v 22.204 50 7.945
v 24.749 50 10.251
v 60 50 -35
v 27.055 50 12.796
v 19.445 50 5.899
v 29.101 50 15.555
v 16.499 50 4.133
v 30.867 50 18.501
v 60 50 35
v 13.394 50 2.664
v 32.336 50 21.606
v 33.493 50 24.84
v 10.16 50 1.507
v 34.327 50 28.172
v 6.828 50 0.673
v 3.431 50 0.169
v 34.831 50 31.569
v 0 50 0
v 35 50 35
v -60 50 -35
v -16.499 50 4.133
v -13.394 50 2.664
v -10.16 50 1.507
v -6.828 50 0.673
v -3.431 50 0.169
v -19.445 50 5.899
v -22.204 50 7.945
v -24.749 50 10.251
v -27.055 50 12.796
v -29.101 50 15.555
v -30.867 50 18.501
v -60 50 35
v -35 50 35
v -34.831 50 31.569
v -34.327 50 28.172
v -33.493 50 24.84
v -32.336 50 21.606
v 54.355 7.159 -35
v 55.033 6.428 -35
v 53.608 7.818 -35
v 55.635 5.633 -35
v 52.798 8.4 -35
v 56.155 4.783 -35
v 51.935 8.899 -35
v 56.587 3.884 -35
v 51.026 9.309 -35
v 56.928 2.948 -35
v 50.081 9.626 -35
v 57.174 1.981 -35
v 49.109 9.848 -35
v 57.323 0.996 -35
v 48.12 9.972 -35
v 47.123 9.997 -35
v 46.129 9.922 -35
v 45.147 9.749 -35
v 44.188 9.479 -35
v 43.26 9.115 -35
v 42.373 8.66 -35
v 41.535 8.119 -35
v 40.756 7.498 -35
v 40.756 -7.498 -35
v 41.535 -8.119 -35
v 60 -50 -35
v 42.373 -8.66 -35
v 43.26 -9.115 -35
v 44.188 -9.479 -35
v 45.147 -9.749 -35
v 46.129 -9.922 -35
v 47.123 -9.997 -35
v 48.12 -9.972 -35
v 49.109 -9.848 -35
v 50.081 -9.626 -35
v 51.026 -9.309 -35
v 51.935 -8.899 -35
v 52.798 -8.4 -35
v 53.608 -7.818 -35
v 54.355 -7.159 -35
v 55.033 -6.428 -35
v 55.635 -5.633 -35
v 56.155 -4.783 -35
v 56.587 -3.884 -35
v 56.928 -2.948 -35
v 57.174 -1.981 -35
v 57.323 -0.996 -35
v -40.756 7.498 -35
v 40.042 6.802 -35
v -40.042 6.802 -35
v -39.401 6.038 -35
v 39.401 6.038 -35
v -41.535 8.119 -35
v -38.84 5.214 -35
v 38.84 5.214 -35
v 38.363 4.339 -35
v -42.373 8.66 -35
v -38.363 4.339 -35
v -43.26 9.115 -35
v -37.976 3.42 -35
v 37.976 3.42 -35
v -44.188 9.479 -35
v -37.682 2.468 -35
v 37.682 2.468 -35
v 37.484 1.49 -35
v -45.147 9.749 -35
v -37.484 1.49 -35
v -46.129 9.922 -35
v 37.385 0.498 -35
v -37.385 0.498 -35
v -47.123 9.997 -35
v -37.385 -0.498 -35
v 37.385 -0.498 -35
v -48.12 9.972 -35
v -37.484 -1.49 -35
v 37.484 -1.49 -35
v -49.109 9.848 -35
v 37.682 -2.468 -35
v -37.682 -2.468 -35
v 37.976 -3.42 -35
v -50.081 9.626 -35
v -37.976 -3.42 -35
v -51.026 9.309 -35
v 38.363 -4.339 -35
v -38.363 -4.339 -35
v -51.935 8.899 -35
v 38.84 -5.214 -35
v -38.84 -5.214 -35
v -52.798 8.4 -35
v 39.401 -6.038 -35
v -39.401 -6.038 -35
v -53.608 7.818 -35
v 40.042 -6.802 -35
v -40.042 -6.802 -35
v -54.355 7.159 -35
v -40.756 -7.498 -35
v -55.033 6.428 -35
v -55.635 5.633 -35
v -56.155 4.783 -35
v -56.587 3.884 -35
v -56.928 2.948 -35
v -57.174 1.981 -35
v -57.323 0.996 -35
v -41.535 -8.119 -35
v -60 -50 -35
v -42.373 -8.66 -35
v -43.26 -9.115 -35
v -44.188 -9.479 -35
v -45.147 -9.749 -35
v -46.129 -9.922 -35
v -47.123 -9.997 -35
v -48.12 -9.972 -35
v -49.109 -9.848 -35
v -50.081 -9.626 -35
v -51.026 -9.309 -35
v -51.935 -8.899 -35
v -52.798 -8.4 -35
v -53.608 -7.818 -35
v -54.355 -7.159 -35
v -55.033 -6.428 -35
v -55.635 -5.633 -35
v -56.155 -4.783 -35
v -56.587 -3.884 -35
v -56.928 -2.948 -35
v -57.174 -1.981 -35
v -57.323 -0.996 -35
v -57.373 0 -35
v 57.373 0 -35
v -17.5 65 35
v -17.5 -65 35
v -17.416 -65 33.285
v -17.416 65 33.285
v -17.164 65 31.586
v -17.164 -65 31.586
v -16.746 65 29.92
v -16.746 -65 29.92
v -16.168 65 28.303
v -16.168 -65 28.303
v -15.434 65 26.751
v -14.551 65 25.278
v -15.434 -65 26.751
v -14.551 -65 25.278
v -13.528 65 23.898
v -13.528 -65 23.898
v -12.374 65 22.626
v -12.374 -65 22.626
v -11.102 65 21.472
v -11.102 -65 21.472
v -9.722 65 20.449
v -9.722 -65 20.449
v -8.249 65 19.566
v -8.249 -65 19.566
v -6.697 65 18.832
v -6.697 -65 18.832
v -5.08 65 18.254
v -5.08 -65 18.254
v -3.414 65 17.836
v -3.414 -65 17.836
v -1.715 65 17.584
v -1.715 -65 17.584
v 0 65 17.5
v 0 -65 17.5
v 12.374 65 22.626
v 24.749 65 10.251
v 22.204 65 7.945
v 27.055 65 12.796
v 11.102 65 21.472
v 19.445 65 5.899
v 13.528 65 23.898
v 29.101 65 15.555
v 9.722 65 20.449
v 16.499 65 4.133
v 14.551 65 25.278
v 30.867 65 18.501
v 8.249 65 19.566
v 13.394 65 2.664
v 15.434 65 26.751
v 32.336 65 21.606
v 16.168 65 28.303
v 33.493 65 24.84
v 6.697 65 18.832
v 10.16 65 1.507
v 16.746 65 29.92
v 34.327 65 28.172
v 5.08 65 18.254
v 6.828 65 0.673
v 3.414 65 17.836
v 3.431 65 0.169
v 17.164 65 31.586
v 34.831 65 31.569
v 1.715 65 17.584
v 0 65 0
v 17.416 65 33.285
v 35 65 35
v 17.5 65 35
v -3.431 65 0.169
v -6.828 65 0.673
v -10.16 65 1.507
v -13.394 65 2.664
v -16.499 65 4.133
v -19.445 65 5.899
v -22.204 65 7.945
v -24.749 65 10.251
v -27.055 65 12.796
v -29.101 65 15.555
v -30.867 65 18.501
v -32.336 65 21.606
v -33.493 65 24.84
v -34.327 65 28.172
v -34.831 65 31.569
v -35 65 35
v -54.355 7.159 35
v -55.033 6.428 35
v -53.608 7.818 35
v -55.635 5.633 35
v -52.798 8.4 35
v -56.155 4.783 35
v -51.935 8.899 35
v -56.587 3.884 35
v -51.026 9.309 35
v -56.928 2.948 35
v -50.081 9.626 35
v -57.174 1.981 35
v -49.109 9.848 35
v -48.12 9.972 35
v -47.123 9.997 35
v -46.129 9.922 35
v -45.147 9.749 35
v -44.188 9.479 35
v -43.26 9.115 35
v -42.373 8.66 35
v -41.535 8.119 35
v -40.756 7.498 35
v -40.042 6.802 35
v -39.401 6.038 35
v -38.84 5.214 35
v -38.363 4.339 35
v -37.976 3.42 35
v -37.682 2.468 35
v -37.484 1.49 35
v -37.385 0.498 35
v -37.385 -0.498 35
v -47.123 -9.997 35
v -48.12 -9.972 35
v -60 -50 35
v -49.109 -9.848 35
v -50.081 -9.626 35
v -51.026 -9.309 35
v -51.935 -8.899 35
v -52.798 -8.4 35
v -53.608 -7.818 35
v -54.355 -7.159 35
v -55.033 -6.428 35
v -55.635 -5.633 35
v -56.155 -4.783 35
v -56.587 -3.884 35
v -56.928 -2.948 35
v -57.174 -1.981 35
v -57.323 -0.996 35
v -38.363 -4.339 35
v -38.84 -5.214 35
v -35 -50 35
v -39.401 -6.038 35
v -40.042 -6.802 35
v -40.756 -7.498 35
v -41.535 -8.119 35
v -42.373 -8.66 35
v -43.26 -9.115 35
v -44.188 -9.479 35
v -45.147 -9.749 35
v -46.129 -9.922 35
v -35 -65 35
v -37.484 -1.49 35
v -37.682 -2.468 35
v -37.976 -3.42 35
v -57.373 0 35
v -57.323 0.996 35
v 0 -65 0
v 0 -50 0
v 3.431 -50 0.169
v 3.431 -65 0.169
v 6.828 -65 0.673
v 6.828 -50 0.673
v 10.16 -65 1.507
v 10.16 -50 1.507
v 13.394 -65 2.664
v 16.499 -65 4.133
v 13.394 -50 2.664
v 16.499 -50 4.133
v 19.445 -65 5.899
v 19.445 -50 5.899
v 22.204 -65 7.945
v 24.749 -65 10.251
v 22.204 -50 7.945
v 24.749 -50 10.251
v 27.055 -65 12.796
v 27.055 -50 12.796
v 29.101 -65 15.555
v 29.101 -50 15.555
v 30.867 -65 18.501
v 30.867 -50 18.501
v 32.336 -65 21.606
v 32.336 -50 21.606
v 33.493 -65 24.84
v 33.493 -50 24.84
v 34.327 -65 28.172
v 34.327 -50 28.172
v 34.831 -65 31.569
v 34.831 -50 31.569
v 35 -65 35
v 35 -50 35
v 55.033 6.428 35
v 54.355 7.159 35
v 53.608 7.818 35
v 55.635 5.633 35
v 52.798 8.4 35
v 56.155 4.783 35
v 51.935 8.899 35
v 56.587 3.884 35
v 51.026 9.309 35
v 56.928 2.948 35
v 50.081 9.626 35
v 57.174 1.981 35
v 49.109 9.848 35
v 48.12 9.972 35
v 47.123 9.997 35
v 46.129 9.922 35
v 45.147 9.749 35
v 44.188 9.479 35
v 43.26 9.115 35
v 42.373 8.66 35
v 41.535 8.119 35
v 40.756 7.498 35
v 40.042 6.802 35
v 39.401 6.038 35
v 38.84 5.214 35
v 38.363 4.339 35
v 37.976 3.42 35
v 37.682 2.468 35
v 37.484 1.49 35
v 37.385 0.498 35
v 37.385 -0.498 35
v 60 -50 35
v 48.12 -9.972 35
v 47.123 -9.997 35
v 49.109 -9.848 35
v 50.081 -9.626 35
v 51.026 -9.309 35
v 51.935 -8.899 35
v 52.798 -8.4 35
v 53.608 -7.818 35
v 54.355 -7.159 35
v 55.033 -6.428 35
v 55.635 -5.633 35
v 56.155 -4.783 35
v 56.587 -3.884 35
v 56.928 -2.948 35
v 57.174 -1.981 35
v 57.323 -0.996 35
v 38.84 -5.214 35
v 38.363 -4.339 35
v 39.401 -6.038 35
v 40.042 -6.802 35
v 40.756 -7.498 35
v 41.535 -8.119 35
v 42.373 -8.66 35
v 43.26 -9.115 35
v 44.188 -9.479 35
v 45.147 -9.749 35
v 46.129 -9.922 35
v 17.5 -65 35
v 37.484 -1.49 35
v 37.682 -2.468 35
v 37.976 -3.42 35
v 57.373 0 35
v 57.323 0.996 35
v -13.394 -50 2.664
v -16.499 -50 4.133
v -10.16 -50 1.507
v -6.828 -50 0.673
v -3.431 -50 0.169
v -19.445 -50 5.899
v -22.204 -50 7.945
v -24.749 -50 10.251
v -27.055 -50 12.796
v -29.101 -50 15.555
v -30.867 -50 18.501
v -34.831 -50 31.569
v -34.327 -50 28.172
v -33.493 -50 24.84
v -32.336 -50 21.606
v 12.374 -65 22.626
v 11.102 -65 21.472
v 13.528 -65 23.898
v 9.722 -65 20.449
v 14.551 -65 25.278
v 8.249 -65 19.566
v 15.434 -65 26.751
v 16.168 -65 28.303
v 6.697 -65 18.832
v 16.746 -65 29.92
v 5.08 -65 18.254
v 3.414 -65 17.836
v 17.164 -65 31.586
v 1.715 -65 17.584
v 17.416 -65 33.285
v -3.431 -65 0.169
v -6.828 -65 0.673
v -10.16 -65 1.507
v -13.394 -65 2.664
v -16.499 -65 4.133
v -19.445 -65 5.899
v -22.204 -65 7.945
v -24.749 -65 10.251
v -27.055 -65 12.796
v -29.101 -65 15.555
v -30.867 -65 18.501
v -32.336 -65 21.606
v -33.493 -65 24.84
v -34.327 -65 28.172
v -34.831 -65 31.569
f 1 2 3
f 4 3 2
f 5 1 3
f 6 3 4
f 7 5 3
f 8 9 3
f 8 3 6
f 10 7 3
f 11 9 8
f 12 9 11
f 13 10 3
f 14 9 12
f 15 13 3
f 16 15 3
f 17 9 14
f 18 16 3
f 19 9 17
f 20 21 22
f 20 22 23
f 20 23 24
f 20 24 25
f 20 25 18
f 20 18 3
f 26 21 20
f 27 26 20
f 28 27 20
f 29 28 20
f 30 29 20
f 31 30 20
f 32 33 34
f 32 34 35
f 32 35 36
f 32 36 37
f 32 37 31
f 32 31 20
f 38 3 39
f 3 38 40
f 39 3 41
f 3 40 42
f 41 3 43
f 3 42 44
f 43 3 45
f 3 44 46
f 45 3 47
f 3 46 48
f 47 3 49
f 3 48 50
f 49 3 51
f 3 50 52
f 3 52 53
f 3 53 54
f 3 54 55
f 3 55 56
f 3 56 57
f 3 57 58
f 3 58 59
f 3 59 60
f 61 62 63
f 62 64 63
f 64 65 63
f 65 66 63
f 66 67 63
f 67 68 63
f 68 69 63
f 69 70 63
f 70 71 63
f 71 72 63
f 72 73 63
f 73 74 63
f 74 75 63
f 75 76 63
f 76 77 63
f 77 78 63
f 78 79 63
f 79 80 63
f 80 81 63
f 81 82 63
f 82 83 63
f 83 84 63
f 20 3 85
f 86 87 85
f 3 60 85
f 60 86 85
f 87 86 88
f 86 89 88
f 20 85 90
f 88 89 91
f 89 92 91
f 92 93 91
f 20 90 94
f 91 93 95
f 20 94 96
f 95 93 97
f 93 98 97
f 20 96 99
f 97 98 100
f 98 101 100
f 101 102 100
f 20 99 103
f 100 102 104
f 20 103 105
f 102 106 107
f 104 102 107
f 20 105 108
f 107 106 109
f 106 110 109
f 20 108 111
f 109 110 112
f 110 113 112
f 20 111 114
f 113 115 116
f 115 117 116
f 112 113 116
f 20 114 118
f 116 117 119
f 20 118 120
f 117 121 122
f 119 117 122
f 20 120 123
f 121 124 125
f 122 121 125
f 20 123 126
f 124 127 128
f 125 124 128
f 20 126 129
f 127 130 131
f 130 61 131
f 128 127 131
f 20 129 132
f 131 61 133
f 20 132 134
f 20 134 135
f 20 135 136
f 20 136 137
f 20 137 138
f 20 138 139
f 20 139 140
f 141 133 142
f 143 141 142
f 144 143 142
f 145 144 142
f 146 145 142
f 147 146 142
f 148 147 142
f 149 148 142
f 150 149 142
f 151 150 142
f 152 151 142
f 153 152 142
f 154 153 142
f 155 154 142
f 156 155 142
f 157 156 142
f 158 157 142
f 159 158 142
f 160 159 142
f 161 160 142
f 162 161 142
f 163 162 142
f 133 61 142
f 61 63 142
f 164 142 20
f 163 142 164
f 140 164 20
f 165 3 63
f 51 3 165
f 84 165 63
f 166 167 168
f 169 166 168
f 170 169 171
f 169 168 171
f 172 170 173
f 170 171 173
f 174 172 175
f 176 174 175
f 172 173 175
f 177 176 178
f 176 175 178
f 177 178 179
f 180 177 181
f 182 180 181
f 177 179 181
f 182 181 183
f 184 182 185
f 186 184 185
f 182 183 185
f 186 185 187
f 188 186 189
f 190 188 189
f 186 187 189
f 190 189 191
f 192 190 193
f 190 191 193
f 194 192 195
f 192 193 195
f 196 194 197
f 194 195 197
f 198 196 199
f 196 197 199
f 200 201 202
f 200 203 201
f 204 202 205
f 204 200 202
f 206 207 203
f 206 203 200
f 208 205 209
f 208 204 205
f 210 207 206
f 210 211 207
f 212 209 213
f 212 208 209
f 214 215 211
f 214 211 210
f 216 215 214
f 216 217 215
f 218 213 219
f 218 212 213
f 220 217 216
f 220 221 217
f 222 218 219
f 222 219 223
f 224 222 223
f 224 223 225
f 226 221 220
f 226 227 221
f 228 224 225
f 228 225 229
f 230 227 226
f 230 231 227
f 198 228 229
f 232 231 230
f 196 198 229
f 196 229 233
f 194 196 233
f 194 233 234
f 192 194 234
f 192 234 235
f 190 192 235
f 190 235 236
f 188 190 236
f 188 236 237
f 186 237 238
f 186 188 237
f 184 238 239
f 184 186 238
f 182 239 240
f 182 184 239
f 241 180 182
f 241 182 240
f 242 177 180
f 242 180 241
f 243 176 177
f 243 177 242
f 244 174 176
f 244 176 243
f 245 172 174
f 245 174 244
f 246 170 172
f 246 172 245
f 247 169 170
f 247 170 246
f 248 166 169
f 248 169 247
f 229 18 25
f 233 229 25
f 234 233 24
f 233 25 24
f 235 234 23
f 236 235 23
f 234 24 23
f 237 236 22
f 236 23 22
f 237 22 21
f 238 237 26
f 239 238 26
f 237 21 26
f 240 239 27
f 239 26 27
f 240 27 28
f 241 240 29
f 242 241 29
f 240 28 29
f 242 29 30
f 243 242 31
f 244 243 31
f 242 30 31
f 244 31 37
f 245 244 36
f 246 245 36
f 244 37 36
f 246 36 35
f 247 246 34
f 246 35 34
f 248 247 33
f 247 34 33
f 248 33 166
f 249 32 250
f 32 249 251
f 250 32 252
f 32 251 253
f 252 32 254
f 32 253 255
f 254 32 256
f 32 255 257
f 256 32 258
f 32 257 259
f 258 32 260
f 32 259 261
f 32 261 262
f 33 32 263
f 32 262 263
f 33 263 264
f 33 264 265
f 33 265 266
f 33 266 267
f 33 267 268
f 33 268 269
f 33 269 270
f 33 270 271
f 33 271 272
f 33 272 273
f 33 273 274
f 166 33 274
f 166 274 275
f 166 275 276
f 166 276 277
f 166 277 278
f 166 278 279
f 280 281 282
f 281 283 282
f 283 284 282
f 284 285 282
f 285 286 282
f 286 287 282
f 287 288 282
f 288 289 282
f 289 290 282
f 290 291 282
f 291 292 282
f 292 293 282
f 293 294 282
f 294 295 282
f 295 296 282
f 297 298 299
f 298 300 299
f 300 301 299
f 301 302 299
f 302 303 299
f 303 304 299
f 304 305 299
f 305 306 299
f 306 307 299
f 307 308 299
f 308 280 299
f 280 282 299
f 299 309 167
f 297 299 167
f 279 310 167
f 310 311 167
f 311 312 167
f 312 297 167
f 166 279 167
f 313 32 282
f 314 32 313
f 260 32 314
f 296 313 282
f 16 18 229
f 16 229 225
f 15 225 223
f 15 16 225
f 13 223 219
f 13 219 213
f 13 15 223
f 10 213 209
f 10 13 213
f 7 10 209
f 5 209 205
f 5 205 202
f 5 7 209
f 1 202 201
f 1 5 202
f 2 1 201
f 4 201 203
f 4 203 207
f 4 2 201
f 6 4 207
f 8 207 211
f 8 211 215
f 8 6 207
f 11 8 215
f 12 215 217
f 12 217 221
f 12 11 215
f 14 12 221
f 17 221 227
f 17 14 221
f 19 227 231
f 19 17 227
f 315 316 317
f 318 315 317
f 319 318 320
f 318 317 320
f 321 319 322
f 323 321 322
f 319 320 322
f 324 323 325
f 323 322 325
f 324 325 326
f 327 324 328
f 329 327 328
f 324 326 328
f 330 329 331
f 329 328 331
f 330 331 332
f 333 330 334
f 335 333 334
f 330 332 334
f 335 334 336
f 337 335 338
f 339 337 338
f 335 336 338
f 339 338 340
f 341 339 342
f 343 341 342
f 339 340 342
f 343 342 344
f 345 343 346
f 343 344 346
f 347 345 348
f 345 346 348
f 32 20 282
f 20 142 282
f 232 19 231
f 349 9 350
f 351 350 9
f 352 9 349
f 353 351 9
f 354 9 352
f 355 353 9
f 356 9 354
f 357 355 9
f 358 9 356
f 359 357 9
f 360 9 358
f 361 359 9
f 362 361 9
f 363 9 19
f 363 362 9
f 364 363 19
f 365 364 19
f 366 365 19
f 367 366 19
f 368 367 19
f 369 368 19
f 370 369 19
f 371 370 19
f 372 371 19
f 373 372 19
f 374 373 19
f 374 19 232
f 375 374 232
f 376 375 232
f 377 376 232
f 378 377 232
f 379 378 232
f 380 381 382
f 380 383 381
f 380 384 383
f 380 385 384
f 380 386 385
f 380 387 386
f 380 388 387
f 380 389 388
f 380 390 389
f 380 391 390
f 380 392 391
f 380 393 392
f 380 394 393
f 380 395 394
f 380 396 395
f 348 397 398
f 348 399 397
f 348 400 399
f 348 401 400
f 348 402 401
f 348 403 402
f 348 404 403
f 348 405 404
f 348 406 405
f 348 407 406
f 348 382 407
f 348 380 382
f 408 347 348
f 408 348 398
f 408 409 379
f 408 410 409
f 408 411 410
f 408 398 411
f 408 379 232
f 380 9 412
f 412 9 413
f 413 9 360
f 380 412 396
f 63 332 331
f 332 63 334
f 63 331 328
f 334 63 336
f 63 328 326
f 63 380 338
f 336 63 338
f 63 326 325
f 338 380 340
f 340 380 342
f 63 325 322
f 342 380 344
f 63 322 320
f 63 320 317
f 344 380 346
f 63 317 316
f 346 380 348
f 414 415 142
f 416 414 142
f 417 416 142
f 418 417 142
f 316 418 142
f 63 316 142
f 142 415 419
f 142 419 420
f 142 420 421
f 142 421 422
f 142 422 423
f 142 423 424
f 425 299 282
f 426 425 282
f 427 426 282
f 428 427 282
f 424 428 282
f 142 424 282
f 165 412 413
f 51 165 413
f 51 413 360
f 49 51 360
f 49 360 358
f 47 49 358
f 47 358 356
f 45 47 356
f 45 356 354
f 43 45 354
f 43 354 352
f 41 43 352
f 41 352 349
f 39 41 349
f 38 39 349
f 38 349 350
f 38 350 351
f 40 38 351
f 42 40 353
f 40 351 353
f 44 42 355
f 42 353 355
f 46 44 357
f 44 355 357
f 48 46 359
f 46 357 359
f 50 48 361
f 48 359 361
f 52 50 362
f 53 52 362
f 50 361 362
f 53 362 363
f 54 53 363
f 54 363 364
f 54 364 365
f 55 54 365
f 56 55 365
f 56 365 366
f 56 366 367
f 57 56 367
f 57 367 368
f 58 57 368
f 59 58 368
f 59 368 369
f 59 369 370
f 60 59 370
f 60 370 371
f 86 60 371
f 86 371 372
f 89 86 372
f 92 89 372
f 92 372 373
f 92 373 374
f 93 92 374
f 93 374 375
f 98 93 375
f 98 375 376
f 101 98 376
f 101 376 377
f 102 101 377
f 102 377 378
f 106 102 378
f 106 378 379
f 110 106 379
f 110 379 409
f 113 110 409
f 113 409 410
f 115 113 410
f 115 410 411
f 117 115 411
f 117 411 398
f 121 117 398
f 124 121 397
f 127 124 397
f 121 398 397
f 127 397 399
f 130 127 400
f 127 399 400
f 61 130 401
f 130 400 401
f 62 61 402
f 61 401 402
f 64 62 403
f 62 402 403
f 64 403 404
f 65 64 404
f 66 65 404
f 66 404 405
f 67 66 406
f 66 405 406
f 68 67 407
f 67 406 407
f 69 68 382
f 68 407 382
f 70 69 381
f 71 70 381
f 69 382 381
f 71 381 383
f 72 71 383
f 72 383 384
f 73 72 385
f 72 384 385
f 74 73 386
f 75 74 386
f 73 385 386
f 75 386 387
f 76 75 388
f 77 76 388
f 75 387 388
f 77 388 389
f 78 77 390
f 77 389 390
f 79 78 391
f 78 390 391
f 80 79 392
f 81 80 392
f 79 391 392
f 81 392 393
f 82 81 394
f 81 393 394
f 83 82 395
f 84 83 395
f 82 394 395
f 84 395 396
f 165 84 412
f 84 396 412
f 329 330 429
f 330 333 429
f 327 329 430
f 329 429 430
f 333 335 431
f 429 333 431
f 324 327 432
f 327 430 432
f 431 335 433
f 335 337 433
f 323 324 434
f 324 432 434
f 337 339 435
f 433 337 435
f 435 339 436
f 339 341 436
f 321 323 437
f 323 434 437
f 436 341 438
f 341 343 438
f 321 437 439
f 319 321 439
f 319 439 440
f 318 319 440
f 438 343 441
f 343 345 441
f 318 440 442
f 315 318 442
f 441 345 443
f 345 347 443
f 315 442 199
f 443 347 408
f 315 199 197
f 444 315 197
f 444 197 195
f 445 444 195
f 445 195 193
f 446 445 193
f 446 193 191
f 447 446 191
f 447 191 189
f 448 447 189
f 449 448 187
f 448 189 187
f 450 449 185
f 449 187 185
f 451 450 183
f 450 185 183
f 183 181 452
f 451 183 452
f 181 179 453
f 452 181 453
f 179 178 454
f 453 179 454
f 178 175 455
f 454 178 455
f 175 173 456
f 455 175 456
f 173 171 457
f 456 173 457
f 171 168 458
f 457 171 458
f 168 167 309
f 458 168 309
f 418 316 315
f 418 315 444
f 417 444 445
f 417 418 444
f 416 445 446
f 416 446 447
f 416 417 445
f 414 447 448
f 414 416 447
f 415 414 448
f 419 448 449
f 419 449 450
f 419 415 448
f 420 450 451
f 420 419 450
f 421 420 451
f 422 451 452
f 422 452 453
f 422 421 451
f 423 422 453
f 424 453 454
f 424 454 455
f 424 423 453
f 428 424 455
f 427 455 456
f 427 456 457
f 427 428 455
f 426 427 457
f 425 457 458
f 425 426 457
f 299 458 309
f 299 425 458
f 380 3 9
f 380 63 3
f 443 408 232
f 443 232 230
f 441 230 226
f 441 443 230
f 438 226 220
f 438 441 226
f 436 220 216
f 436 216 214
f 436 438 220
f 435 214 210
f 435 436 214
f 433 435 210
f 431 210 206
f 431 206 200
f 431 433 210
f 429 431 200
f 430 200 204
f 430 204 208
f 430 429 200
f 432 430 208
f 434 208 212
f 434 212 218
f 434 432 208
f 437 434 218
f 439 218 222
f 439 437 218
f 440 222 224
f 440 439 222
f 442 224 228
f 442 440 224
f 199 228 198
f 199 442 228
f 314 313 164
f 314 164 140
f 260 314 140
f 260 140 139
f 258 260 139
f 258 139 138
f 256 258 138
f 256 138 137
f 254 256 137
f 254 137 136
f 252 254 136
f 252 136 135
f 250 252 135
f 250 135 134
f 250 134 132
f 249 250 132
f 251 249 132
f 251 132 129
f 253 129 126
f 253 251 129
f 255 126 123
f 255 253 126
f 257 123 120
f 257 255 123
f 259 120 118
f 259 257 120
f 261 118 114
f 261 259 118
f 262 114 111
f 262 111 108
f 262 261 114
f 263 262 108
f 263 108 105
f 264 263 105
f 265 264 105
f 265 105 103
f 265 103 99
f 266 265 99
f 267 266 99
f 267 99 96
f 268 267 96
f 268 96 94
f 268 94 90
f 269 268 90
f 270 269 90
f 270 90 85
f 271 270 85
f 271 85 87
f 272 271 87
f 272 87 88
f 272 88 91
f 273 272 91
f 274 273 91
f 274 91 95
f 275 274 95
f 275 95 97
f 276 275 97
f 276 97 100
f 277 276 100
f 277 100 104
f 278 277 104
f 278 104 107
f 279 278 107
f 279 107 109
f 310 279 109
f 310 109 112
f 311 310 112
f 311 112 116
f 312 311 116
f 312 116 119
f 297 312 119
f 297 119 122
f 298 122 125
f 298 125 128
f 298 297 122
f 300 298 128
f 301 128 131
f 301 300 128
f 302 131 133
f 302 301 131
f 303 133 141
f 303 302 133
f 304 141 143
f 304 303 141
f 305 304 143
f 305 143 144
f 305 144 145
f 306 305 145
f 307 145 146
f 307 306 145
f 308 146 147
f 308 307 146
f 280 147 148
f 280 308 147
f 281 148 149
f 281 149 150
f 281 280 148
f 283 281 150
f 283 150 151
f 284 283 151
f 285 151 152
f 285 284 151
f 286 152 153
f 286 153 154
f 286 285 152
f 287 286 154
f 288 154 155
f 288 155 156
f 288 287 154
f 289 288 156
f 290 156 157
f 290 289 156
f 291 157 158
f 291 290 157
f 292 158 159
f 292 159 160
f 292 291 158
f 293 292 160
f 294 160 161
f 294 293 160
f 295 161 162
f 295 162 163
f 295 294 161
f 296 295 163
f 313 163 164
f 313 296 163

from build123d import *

# Parameters (mm, degrees)
F1_DEPTH = 50
F2_DEPTH = 50
F3_DEPTH = 65
F4_DEPTH = 65
F5_R     = 10
F6_DEPTH = 200


with BuildPart() as f1:
    # F0 (on Front) → F1 (new body)
    with BuildSketch(Plane.XZ):
        with BuildLine():
            Line((60, 35), (35, 35))
            ThreePointArc((35, 35), (24.7487373415, 10.2512626585), (0, 0))
            Line((0, 0), (0, -35))
            Line((0, -35), (60, -35))
            Line((60, -35), (60, 35))
        make_face()
    extrude(amount=F1_DEPTH)

    # F2 (add): a face of the model
    f2_faces = [f1.faces().sort_by_distance(p)[0] for p in [
        (34.5003777815, 0, -5.9860884872),
    ]]
    extrude(f2_faces, amount=F2_DEPTH)

    # F0 (on Front) → F3 (join)
    with BuildSketch(Plane.XZ):
        with BuildLine():
            Line((35, 35), (17.5, 35))
            ThreePointArc((17.5, 35), (12.3743686708, 22.6256313292), (0, 17.5))
            Line((0, 17.5), (0, 0))
            ThreePointArc((0, 0), (24.7487373415, 10.2512626585), (35, 35))
        make_face()
    extrude(amount=F3_DEPTH)

    # F4 (add): a face of the model
    f4_faces = [f1.faces().sort_by_distance(p)[0] for p in [
        (17.3302049145, 0, 17.6697950855),
    ]]
    extrude(f4_faces, amount=F4_DEPTH)

    # F5 (on face) → F6 (cut)
    with BuildSketch(Plane.XY.offset(35)):
        with Locations((47.3726391792, 0)):
            Circle(F5_R)
    extrude(amount=-F6_DEPTH, mode=Mode.SUBTRACT)

    # F7: F1 across face


with BuildPart() as f1_1:
    add(f1.part)
    add(f1.part.mirror(Plane(origin=(0, 0, -7.1590909091), x_dir=(0, -1, 0), z_dir=(-1, 0, 0))))


solid = f1_1.part
